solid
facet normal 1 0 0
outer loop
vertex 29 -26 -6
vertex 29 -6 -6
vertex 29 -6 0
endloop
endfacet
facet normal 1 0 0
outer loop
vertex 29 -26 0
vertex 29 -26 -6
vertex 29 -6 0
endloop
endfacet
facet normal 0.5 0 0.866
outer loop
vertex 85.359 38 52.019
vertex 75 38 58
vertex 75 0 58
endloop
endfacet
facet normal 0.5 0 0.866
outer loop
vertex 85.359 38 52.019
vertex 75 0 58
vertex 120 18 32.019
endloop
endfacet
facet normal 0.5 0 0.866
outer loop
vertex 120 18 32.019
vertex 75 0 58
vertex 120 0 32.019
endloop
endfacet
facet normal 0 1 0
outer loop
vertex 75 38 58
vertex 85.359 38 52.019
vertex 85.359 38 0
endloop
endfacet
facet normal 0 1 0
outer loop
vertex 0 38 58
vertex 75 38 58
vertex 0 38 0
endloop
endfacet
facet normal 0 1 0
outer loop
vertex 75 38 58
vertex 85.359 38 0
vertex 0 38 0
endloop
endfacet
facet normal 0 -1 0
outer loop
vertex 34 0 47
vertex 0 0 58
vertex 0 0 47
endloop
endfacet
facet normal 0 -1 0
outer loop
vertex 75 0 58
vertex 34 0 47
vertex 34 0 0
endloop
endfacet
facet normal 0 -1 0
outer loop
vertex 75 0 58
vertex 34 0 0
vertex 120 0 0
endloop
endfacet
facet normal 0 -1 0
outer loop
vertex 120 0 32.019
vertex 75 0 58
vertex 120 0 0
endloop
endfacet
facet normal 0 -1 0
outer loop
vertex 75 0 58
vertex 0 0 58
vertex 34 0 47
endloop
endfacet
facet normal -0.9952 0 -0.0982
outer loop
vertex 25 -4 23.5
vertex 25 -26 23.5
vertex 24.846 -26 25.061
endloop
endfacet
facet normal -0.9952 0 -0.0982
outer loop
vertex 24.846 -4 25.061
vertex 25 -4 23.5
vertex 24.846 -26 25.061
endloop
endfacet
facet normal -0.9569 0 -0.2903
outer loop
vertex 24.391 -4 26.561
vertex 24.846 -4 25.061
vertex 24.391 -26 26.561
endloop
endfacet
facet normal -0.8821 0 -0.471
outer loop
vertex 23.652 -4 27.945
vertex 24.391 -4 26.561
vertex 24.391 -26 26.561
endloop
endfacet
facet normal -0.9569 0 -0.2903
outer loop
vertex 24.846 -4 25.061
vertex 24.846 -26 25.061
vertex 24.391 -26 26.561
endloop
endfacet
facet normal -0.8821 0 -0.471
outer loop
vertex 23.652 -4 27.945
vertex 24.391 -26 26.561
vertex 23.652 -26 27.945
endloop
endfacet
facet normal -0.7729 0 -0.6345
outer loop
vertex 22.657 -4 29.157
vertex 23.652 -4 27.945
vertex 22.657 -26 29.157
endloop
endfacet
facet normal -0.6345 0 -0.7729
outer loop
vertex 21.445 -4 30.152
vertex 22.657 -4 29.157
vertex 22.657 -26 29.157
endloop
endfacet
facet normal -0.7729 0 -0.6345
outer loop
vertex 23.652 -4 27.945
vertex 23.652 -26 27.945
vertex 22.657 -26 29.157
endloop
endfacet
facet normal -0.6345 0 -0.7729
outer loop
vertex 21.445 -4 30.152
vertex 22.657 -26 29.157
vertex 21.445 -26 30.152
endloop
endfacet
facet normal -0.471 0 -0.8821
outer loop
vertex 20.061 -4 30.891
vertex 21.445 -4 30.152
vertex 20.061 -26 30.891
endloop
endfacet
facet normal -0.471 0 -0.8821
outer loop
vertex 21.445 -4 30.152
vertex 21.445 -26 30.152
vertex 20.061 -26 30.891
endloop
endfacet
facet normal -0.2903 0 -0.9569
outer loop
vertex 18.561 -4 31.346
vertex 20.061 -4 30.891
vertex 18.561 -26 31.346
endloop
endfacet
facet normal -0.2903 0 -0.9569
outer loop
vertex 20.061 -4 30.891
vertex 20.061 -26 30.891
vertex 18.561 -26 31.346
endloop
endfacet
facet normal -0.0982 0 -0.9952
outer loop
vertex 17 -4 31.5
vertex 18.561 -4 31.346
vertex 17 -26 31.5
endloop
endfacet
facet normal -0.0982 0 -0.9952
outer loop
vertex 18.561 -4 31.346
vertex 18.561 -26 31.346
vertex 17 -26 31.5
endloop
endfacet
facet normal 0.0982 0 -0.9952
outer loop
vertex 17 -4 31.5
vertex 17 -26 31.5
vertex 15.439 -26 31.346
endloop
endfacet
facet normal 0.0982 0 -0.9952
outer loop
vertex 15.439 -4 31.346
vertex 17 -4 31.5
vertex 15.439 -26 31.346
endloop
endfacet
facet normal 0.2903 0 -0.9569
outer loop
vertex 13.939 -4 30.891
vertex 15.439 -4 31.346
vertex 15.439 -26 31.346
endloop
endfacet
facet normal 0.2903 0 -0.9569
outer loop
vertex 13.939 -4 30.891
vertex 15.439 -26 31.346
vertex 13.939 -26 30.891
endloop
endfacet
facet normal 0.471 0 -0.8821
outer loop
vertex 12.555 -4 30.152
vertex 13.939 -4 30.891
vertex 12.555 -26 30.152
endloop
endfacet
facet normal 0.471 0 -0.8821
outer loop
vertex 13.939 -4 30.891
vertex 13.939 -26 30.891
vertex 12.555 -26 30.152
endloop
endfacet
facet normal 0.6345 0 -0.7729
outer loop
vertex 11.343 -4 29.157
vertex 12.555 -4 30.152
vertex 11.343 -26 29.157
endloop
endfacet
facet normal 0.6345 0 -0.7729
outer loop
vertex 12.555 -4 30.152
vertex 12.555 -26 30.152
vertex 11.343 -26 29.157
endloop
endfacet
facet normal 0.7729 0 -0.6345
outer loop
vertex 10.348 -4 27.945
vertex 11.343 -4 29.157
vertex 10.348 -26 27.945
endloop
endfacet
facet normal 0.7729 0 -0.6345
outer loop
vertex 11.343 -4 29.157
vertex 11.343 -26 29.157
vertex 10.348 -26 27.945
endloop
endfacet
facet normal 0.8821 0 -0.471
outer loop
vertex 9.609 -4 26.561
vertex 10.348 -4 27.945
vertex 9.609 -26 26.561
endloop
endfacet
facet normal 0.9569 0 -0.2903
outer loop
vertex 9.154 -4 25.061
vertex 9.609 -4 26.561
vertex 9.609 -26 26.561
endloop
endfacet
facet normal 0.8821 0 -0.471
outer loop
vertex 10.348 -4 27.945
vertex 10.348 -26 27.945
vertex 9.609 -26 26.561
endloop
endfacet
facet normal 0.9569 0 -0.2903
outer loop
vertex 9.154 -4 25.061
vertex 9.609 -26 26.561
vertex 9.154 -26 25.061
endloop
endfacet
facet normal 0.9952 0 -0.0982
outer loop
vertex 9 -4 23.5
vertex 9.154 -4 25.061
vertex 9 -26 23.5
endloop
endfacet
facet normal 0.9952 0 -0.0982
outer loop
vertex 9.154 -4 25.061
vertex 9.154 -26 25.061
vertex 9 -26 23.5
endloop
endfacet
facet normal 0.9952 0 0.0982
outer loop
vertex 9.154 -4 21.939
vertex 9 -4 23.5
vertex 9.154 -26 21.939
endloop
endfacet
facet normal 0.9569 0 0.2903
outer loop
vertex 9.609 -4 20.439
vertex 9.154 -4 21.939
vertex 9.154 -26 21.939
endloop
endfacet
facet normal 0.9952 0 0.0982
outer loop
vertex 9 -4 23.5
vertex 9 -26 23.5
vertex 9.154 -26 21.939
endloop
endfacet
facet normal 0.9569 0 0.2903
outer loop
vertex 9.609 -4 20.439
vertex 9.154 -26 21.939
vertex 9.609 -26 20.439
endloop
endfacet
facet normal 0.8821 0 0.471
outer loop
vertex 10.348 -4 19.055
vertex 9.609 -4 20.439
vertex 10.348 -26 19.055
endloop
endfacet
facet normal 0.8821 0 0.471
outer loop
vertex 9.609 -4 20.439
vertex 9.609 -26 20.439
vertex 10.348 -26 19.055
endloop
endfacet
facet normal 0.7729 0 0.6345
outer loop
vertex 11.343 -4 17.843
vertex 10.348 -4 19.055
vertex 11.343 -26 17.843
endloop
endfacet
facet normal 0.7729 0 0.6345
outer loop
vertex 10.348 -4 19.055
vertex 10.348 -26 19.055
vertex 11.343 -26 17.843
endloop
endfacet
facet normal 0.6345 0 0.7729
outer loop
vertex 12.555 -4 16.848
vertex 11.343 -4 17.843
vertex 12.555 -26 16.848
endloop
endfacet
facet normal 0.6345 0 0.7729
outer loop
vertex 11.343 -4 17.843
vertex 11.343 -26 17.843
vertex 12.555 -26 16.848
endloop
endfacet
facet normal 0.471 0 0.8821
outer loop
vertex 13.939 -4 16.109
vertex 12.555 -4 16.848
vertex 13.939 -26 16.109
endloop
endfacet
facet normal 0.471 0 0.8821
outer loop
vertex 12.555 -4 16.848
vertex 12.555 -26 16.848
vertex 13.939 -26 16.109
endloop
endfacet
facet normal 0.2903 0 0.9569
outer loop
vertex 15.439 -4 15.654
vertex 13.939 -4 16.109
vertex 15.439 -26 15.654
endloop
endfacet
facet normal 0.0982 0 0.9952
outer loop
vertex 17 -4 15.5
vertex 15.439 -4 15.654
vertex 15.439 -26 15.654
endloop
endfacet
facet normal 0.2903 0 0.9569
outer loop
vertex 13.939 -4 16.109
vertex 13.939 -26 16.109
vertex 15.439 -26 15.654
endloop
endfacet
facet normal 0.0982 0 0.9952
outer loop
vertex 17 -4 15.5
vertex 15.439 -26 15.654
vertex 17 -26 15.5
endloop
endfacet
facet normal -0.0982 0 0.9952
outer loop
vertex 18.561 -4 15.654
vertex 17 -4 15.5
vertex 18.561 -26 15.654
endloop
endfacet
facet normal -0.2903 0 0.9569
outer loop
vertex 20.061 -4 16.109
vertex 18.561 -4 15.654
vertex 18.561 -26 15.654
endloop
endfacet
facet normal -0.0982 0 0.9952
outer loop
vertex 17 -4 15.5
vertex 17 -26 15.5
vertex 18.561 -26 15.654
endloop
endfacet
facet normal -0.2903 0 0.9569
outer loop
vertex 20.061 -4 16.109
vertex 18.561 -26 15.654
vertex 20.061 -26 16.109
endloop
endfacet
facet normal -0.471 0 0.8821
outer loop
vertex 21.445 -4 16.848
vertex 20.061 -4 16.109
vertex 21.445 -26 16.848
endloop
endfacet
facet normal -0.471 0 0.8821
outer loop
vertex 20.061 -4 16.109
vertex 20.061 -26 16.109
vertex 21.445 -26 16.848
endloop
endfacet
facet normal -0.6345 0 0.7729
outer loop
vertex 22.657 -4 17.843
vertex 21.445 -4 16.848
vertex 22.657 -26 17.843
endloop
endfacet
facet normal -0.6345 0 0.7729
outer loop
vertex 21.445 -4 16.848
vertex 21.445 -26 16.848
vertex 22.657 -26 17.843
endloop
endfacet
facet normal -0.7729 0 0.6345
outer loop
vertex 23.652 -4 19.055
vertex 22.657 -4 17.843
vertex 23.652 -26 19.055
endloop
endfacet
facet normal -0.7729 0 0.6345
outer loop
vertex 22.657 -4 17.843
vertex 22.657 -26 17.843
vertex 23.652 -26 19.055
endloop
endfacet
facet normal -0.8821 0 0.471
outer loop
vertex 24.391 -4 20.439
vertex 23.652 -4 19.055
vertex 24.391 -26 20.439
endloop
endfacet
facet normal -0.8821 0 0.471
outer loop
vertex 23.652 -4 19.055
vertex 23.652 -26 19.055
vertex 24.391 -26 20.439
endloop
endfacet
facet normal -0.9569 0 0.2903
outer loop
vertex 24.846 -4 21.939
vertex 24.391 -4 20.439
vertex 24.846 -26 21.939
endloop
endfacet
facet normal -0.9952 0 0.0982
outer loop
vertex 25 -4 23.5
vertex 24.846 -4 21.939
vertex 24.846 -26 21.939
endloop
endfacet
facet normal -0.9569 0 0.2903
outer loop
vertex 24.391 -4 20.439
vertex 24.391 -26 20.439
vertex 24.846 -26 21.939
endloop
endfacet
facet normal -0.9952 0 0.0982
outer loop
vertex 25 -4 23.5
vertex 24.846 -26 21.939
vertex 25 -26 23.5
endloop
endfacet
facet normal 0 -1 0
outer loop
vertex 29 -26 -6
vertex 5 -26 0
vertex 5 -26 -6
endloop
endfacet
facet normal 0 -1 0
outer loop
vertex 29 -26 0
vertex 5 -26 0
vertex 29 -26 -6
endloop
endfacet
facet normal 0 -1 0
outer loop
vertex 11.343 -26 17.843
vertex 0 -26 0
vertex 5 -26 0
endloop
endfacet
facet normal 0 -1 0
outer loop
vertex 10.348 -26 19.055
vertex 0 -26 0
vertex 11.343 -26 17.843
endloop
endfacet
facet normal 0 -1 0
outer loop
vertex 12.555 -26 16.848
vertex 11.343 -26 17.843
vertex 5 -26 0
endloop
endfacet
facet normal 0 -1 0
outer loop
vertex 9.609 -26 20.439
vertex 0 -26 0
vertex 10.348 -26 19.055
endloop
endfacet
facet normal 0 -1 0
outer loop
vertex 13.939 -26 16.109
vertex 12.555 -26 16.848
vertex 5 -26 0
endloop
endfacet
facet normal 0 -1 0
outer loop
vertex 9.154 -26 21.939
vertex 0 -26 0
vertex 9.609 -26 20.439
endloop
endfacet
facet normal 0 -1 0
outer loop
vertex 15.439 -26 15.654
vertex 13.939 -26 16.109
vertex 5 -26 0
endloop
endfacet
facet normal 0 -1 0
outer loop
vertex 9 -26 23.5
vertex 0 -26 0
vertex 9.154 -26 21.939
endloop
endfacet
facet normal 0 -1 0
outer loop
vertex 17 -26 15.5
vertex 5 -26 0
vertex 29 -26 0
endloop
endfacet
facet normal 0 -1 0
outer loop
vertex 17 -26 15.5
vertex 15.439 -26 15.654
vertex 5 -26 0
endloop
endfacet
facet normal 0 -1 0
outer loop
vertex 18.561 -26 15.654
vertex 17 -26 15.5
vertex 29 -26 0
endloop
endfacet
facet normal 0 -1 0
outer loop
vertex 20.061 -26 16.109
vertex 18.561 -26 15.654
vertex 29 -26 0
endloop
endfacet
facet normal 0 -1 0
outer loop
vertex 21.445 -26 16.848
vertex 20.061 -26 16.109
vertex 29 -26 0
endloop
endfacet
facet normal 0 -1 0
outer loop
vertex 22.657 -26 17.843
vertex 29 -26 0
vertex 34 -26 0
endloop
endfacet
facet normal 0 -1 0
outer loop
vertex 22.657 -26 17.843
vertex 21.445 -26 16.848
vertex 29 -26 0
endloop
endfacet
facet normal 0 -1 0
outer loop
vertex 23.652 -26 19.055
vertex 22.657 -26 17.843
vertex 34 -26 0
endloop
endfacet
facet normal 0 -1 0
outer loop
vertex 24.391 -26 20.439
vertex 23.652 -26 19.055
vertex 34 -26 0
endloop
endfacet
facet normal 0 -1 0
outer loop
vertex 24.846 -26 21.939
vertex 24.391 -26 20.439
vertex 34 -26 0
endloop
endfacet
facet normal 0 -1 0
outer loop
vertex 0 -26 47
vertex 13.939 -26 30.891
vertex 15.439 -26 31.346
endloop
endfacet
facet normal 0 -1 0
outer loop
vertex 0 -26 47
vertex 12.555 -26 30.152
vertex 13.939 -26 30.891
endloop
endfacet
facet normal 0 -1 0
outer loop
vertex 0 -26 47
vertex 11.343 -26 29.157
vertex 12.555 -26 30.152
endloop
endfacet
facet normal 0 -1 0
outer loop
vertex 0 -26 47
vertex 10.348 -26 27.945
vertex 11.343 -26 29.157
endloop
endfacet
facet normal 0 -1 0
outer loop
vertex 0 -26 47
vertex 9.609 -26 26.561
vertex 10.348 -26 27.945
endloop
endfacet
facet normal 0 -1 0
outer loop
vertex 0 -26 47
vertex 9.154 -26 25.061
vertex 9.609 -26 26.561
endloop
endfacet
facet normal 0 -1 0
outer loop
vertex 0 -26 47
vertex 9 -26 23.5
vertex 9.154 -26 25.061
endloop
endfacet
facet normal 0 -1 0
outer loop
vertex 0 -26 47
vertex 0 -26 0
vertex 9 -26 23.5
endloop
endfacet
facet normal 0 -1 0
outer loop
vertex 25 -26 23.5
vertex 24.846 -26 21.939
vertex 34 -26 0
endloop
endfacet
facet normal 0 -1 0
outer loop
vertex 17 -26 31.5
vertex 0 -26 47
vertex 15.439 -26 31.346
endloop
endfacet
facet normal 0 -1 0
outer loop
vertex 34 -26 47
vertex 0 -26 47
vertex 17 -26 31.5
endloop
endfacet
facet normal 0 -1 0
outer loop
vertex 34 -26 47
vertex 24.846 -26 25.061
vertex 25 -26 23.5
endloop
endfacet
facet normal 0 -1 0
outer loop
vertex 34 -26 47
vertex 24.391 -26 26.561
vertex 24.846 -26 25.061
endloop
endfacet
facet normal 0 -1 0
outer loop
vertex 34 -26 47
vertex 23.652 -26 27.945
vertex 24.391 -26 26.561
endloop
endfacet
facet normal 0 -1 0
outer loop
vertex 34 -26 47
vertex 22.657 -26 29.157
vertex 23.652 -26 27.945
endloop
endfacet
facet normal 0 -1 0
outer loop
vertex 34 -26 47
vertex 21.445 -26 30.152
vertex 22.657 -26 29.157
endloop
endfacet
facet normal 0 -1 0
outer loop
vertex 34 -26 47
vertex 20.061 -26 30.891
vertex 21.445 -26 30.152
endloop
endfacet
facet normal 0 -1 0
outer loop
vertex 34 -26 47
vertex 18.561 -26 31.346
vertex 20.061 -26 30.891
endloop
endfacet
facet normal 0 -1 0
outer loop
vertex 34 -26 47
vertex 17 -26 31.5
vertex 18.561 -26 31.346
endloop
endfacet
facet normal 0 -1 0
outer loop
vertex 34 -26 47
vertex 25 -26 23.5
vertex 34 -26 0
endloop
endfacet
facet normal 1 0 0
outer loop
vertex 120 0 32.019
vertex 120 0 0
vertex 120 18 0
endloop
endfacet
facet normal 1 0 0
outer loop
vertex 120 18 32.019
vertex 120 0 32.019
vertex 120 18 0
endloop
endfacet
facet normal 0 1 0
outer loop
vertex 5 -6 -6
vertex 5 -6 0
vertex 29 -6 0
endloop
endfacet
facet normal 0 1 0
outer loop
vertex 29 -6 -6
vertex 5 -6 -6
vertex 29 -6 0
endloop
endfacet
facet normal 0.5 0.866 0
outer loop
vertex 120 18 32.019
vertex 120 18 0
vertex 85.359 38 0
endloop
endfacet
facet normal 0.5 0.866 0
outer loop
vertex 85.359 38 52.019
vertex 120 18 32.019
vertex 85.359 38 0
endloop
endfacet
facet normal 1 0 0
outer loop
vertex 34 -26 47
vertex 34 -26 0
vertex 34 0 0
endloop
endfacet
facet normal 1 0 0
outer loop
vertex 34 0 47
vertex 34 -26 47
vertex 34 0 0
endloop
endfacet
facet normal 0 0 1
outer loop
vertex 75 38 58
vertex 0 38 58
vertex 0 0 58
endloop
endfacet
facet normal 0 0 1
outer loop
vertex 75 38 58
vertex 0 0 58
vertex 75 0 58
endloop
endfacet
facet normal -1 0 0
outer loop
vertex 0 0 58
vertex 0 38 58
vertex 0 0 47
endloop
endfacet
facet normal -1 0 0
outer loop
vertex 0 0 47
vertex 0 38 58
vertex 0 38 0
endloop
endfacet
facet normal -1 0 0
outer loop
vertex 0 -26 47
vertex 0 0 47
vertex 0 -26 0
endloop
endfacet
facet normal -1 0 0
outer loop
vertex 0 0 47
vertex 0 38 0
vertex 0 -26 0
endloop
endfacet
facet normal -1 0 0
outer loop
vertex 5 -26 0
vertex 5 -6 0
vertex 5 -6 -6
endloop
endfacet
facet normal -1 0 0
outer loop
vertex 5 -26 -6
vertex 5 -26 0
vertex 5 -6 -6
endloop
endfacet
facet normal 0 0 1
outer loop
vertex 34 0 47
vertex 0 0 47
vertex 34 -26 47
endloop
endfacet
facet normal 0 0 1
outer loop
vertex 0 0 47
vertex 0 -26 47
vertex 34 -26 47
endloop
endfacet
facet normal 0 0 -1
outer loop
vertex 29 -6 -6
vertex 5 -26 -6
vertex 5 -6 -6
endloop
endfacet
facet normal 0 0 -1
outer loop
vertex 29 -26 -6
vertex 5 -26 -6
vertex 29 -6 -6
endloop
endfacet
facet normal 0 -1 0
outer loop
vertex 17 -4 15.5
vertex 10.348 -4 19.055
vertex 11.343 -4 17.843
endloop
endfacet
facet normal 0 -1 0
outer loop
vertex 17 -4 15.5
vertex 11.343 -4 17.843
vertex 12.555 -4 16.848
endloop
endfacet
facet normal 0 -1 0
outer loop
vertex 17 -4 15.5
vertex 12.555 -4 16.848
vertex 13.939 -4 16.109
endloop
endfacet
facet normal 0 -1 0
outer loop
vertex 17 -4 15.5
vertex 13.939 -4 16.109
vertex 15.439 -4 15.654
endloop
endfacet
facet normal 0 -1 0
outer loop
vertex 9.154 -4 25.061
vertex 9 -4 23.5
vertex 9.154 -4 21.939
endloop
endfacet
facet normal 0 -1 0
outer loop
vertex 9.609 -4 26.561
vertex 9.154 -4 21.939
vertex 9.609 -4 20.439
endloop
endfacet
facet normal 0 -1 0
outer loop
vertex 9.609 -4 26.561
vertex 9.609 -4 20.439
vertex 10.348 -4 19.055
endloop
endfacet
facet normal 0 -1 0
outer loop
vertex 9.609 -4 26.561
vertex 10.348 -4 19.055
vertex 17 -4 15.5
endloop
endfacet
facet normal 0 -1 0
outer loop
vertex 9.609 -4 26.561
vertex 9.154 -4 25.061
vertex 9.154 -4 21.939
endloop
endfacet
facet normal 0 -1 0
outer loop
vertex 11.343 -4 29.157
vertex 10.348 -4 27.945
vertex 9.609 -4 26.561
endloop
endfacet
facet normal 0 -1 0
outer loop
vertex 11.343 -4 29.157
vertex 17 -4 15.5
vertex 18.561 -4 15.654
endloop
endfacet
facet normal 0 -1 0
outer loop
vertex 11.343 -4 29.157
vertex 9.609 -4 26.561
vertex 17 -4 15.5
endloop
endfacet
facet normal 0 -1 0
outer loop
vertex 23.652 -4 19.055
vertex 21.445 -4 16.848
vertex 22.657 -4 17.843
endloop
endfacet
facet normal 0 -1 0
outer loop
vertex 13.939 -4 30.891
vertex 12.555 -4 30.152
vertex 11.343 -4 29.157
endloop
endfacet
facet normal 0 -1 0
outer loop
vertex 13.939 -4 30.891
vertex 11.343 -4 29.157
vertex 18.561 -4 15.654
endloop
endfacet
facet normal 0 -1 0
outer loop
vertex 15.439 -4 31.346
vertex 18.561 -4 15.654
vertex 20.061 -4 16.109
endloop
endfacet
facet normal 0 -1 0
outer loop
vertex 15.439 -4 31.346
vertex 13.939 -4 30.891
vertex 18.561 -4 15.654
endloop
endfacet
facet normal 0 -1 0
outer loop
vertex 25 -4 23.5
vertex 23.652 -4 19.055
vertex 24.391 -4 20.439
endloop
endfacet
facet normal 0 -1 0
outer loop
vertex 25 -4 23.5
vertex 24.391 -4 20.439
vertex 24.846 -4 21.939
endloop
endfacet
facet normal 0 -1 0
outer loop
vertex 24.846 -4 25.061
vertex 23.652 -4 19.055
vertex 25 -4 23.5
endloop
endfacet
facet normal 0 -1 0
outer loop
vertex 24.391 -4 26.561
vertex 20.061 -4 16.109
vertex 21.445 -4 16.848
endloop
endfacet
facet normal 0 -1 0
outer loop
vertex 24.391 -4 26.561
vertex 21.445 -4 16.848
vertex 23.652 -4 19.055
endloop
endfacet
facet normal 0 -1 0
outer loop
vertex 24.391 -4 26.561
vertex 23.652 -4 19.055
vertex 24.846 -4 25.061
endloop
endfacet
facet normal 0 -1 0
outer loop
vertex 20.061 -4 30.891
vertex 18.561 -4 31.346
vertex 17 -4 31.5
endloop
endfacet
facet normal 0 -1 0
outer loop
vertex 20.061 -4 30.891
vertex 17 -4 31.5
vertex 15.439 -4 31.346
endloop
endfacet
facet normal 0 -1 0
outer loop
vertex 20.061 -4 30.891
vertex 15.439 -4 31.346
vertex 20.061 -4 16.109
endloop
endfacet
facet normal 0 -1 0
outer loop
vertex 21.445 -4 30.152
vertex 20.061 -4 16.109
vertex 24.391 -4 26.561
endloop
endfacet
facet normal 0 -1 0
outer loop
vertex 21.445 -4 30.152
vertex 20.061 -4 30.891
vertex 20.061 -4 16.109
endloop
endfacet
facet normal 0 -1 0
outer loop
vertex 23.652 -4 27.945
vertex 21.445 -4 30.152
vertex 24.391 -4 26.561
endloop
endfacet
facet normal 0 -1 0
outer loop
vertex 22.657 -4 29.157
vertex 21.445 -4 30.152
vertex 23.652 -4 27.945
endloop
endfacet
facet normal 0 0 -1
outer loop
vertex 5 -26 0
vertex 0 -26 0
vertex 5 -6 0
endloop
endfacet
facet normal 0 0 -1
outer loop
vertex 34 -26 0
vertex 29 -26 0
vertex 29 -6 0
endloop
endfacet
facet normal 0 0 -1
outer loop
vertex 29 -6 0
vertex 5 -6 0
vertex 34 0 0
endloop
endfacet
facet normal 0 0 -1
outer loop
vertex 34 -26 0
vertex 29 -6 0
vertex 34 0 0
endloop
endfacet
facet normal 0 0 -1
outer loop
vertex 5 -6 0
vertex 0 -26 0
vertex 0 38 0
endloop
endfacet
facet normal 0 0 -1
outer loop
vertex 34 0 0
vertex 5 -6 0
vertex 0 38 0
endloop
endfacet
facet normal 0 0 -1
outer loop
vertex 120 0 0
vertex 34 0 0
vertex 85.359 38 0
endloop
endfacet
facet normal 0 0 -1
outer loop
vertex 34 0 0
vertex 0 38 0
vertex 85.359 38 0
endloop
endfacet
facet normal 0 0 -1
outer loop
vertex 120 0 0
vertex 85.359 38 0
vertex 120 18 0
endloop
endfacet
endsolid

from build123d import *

# Parameters (mm, degrees)
F0_W     = 34
F0_H     = 16
F1_DEPTH = 58
F3_DEPTH = 38.001
F4_W     = 34
F4_H     = 11
F5_DEPTH = 16
F7_DEPTH = 10
F8_R     = 8
F9_DEPTH = 22


with BuildPart() as f1:
    # F0 (on Top) → F1 (new body)
    with BuildSketch(Plane.XY):
        Polygon((0, 38), (0, 0), (34, 0), (75, 0), (75, 38), align=None)
        with Locations((17, -8)):
            Rectangle(F0_W, F0_H)
        Polygon((85.358984, 38), (75, 38), (75, 0), (120, 0), (120, 18), align=None)
    extrude(amount=F1_DEPTH)

    # F2 (on face) → F3 (cut, through all)
    with BuildSketch(Plane.XZ):
        Polygon((75, 58), (120, 32.019238), (120, 58), align=None)
    extrude(amount=-F3_DEPTH, mode=Mode.SUBTRACT)

    # F4 (on face) → F5 (cut, symmetric)
    with BuildSketch(Plane.XZ.offset(16)):
        with Locations((17, 52.5)):
            Rectangle(F4_W, F4_H)
    extrude(amount=F5_DEPTH, both=True, mode=Mode.SUBTRACT)

    # F6 (on face) → F7 (join, symmetric)
    with BuildSketch(Plane.XZ.offset(16)):
        Polygon((34, 47), (0, 47), (0, 0), (5, 0), (5, -6), (29, -6), (29, 0), (34, 0), align=None)
    extrude(amount=F7_DEPTH, both=True)

    # F8 (on face) → F9 (cut)
    with BuildSketch(Plane.XZ.offset(26)):
        with Locations((17, 23.5)):
            Circle(F8_R)
    extrude(amount=-F9_DEPTH, mode=Mode.SUBTRACT)


solid = f1.part
